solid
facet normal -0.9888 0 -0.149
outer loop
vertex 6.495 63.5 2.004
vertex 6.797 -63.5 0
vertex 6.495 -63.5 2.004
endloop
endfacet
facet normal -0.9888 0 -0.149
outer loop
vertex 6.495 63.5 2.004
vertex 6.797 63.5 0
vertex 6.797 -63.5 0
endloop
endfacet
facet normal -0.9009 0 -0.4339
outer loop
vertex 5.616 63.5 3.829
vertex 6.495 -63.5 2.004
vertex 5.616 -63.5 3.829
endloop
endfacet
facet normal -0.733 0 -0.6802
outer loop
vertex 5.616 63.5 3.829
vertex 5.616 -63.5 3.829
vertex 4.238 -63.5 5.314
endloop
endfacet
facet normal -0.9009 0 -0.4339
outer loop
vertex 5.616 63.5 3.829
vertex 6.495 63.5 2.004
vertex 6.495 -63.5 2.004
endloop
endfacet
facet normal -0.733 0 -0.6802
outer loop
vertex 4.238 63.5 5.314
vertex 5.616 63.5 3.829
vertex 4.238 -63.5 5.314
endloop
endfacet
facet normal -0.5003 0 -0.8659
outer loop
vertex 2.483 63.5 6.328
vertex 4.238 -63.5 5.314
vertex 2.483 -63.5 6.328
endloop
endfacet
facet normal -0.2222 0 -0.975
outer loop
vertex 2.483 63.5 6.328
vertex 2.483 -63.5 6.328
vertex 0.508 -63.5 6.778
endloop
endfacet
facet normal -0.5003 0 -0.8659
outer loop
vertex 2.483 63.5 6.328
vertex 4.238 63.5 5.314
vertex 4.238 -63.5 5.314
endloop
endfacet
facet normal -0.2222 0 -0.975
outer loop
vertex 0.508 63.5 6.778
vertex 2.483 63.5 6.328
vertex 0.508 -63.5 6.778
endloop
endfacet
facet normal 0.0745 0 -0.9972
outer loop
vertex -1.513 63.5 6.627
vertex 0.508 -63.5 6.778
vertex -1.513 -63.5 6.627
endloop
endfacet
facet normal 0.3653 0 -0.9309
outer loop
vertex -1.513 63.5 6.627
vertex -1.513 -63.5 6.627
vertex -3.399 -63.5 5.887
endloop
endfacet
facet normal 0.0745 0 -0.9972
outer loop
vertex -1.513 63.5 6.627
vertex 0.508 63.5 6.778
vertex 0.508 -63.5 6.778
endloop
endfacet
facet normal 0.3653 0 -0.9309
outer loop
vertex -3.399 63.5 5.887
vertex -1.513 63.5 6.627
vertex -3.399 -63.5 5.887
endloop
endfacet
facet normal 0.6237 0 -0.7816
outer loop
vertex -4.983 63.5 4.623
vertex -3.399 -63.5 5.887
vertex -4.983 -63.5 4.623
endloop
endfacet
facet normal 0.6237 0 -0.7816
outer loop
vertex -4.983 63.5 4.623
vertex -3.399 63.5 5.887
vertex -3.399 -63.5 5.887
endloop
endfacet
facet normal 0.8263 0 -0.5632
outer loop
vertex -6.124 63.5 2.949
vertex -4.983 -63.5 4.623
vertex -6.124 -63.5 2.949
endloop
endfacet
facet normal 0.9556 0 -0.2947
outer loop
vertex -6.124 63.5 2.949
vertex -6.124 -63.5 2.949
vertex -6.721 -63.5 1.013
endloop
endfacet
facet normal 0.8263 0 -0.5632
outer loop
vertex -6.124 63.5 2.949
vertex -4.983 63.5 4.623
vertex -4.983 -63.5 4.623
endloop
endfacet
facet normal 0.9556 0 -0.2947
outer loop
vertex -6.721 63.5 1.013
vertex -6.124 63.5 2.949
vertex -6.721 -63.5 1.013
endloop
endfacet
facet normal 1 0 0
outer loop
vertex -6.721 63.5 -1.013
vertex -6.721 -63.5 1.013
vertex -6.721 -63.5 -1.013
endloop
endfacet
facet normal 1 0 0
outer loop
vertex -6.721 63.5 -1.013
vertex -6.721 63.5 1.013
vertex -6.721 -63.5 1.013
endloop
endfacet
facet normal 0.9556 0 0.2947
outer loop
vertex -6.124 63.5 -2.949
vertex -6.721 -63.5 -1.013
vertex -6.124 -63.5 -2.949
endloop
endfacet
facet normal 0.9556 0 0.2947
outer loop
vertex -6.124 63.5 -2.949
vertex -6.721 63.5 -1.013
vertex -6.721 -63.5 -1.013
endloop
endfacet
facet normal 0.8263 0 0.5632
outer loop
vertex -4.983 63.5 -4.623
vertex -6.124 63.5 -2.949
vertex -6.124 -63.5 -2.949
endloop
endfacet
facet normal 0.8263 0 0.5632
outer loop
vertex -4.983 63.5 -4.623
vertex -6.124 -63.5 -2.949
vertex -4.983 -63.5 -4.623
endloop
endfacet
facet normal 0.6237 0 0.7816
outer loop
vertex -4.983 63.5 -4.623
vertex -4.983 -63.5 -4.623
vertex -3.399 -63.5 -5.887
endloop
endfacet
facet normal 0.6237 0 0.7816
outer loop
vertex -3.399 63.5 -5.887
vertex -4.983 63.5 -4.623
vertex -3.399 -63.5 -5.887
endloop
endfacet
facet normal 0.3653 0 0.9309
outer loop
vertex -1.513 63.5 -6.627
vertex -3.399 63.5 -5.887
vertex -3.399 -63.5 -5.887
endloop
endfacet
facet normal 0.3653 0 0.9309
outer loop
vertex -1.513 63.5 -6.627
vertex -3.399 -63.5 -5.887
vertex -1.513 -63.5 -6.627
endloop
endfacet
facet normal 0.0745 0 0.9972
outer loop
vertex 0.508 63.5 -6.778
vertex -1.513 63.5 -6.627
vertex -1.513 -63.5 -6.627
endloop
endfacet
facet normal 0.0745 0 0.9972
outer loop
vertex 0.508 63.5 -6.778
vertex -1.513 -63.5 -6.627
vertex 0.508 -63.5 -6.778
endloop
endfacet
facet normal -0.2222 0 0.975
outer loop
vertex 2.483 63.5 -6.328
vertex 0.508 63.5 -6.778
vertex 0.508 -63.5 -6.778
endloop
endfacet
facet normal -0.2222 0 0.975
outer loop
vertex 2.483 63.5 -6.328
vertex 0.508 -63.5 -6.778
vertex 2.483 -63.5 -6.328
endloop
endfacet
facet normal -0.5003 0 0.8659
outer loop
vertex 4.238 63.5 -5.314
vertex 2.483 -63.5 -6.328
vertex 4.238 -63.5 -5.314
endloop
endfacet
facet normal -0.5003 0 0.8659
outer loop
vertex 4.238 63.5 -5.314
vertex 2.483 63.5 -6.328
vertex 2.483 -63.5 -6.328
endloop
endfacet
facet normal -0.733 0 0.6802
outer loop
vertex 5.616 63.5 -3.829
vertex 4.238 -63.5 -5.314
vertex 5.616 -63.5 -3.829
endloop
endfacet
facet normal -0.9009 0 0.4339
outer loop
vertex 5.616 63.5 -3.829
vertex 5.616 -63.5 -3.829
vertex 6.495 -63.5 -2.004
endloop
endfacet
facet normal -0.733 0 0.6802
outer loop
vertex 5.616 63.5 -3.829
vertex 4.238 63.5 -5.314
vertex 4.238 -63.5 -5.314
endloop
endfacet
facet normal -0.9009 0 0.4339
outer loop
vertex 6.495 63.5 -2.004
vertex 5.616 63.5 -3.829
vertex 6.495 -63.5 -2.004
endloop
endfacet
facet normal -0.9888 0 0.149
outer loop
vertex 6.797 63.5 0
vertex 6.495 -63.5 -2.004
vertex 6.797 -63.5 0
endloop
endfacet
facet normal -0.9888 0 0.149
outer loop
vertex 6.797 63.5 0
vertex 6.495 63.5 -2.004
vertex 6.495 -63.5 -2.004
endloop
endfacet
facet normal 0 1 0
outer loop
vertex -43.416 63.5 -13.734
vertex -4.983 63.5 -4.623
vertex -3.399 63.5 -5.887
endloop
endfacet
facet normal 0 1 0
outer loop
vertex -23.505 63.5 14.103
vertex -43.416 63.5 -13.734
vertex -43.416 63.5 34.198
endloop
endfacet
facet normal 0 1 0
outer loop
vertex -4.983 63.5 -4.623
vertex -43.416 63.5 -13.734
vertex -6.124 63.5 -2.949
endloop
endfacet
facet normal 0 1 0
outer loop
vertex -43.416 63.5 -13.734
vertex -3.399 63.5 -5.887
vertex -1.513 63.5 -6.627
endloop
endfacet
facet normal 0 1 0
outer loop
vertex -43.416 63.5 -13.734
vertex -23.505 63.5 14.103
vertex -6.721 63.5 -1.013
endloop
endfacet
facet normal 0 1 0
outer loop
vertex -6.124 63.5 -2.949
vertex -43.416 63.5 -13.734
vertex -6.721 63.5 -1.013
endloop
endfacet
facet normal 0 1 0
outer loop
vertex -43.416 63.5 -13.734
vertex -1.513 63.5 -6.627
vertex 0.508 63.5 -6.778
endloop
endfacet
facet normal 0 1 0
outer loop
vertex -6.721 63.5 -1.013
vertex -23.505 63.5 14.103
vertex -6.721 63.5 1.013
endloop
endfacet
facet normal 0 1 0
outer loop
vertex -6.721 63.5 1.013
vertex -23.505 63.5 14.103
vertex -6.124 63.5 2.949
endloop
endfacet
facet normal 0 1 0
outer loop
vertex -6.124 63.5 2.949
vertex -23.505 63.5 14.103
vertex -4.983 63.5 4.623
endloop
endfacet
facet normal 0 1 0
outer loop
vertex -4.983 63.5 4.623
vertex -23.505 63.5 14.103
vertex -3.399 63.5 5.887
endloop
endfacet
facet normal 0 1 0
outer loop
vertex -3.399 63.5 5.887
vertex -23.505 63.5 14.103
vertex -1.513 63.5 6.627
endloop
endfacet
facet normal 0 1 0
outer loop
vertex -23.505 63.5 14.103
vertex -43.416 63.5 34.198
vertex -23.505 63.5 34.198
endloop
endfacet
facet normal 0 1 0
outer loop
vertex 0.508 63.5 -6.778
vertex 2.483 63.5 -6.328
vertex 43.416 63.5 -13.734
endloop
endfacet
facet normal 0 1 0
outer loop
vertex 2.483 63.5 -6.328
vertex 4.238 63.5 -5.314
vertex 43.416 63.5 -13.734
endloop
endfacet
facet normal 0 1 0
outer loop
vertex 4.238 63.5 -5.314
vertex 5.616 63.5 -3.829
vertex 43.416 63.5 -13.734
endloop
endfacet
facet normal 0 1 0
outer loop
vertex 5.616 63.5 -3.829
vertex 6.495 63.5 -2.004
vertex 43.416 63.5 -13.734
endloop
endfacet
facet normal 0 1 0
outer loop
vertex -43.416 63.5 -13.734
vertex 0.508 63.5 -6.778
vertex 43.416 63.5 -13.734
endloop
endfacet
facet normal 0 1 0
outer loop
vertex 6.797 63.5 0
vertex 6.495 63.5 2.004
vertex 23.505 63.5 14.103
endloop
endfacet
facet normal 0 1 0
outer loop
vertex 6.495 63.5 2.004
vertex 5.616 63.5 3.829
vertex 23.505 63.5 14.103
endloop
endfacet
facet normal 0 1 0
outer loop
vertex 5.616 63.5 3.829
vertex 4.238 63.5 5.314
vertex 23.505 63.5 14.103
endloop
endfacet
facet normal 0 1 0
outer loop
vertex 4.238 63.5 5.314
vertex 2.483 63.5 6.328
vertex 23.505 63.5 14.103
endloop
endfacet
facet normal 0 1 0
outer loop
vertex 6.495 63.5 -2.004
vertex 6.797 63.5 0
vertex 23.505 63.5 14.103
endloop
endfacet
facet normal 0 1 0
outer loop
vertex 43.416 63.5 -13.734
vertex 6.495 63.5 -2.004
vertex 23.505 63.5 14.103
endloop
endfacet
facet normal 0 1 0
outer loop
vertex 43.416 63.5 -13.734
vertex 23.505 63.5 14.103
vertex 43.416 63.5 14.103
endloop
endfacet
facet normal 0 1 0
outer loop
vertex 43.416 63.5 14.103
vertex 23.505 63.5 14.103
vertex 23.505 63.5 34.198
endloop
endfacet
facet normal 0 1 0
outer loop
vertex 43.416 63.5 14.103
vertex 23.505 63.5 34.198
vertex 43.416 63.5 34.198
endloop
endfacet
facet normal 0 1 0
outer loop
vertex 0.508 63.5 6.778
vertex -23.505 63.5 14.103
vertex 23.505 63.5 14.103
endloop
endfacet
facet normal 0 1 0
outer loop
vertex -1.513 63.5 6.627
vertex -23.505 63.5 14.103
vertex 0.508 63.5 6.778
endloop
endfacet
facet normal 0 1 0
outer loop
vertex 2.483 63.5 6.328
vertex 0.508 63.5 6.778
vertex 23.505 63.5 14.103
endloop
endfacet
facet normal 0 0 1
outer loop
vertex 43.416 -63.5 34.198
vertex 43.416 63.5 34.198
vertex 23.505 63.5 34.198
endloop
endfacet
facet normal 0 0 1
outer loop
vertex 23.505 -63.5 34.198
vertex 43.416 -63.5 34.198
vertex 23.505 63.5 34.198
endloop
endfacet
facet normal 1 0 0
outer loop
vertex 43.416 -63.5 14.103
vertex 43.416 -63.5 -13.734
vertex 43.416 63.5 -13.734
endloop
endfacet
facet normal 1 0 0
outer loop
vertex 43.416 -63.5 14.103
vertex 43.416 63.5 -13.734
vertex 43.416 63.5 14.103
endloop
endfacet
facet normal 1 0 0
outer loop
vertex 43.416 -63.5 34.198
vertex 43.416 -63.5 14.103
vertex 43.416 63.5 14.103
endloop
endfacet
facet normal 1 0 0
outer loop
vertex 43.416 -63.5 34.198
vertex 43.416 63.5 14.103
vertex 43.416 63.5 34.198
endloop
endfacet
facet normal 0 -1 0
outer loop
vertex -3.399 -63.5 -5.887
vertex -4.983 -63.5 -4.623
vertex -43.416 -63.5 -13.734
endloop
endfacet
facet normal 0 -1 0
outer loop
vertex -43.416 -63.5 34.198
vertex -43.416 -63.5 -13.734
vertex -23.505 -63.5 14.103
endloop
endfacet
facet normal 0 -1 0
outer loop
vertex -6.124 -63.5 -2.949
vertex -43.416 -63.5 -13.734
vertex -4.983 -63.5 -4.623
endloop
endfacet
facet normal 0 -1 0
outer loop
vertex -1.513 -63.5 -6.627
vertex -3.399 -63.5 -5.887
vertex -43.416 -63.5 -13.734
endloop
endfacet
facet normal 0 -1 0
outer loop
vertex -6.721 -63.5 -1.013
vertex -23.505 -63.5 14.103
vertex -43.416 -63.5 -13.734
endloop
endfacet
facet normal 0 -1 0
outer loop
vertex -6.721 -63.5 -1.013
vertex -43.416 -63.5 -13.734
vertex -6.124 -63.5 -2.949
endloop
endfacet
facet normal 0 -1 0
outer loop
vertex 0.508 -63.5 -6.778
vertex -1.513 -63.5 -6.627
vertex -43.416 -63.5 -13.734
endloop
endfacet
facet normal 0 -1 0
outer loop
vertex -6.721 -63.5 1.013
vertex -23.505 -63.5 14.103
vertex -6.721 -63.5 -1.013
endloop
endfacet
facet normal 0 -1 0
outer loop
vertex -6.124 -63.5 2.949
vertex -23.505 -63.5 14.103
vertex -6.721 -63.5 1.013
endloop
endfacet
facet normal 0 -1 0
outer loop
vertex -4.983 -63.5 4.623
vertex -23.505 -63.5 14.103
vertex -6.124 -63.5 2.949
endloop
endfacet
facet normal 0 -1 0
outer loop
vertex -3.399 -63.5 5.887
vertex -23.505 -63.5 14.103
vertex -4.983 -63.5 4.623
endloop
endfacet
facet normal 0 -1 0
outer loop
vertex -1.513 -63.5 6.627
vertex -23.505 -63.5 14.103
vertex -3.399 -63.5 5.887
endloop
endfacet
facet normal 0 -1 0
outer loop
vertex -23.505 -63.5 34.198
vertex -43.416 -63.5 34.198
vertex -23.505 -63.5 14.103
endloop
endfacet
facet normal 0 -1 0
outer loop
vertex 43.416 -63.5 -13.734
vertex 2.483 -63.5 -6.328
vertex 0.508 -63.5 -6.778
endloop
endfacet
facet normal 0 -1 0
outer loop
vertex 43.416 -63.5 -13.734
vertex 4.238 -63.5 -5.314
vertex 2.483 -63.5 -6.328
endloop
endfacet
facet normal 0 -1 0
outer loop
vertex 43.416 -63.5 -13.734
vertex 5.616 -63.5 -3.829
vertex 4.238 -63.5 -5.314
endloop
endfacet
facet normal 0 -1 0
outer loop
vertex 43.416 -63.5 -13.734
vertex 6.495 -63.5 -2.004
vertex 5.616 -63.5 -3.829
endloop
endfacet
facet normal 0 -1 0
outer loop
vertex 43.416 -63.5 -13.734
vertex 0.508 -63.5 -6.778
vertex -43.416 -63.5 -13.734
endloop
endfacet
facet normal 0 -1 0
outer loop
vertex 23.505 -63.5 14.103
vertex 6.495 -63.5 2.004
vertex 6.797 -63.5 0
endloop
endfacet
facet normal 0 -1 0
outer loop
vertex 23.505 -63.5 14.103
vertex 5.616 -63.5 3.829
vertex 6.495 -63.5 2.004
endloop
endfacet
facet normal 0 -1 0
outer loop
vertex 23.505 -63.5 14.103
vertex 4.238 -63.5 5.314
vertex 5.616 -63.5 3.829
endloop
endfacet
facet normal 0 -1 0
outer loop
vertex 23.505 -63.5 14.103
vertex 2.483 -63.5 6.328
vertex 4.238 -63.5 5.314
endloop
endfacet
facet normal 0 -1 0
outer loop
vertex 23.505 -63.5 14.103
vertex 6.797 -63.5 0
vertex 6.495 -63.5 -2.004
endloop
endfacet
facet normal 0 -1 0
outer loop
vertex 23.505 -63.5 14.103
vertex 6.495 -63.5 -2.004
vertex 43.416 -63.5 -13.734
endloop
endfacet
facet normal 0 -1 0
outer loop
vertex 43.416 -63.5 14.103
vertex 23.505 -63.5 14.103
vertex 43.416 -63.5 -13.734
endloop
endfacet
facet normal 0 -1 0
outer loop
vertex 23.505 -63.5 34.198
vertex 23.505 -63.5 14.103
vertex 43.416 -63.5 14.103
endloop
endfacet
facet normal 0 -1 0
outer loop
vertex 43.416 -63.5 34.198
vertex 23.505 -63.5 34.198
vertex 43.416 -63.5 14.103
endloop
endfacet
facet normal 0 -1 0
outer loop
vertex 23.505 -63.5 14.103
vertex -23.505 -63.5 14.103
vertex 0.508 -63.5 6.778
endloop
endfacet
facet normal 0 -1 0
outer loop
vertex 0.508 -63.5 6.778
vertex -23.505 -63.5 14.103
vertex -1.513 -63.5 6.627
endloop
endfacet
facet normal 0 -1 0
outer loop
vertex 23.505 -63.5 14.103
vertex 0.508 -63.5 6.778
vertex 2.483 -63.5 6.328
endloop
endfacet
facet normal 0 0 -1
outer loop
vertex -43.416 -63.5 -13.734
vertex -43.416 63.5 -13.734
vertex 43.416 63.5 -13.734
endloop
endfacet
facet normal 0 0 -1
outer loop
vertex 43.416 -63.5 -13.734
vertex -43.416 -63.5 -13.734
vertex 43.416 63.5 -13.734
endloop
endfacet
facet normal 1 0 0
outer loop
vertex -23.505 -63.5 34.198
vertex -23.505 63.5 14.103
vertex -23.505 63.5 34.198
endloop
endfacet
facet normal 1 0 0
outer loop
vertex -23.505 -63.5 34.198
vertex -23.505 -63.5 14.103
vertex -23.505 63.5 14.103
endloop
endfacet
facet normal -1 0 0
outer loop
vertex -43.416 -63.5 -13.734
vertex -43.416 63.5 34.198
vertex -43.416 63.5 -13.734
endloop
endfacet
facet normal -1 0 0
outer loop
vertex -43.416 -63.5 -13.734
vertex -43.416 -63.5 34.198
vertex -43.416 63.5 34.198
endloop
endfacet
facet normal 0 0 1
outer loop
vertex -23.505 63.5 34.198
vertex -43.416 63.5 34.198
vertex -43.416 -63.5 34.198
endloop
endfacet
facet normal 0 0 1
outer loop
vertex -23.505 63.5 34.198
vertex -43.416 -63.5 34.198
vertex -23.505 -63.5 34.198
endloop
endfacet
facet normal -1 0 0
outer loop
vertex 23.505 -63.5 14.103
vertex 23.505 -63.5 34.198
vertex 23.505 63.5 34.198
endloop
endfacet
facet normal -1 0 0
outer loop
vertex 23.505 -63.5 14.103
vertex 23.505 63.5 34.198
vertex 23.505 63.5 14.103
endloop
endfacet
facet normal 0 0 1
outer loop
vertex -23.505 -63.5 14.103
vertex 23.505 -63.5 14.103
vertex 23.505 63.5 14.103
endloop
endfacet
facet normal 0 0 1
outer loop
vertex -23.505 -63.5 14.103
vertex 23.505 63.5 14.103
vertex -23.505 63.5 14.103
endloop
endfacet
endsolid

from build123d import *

# Parameters (mm, degrees)
F0_W     = 19.9103225023
F0_H     = 20.0946768746
F0_R     = 6.7973918103
F1_DEPTH = 63.5


# Not quite as in the source:
# - ends of sketch curves that miss each other by under 0.0002 mm in the source are joined


with BuildPart() as f1:
    # F0 (on Front) → F1 (new body, symmetric)
    with BuildSketch(Plane.XZ):
        with Locations((-33.4604037926, 24.1504837759)):
            Rectangle(F0_W, F0_H)
        Polygon((-23.5052425414, 14.1031453386), (-43.4155650437, 14.1031453386), (-43.4155650437, -13.7344365939), (43.4155575931, -13.7344365939), (43.4155575931, 14.1031453386), (23.5052425414, 14.1031453386), align=None)
        Circle(F0_R, mode=Mode.SUBTRACT)
        Polygon((23.5052425414, 34.1978222132), (23.5052425414, 14.1031453386), (43.4155575931, 14.1031453386), (43.4155650437, 34.1978222132), align=None)
    extrude(amount=F1_DEPTH, both=True)


solid = f1.part
